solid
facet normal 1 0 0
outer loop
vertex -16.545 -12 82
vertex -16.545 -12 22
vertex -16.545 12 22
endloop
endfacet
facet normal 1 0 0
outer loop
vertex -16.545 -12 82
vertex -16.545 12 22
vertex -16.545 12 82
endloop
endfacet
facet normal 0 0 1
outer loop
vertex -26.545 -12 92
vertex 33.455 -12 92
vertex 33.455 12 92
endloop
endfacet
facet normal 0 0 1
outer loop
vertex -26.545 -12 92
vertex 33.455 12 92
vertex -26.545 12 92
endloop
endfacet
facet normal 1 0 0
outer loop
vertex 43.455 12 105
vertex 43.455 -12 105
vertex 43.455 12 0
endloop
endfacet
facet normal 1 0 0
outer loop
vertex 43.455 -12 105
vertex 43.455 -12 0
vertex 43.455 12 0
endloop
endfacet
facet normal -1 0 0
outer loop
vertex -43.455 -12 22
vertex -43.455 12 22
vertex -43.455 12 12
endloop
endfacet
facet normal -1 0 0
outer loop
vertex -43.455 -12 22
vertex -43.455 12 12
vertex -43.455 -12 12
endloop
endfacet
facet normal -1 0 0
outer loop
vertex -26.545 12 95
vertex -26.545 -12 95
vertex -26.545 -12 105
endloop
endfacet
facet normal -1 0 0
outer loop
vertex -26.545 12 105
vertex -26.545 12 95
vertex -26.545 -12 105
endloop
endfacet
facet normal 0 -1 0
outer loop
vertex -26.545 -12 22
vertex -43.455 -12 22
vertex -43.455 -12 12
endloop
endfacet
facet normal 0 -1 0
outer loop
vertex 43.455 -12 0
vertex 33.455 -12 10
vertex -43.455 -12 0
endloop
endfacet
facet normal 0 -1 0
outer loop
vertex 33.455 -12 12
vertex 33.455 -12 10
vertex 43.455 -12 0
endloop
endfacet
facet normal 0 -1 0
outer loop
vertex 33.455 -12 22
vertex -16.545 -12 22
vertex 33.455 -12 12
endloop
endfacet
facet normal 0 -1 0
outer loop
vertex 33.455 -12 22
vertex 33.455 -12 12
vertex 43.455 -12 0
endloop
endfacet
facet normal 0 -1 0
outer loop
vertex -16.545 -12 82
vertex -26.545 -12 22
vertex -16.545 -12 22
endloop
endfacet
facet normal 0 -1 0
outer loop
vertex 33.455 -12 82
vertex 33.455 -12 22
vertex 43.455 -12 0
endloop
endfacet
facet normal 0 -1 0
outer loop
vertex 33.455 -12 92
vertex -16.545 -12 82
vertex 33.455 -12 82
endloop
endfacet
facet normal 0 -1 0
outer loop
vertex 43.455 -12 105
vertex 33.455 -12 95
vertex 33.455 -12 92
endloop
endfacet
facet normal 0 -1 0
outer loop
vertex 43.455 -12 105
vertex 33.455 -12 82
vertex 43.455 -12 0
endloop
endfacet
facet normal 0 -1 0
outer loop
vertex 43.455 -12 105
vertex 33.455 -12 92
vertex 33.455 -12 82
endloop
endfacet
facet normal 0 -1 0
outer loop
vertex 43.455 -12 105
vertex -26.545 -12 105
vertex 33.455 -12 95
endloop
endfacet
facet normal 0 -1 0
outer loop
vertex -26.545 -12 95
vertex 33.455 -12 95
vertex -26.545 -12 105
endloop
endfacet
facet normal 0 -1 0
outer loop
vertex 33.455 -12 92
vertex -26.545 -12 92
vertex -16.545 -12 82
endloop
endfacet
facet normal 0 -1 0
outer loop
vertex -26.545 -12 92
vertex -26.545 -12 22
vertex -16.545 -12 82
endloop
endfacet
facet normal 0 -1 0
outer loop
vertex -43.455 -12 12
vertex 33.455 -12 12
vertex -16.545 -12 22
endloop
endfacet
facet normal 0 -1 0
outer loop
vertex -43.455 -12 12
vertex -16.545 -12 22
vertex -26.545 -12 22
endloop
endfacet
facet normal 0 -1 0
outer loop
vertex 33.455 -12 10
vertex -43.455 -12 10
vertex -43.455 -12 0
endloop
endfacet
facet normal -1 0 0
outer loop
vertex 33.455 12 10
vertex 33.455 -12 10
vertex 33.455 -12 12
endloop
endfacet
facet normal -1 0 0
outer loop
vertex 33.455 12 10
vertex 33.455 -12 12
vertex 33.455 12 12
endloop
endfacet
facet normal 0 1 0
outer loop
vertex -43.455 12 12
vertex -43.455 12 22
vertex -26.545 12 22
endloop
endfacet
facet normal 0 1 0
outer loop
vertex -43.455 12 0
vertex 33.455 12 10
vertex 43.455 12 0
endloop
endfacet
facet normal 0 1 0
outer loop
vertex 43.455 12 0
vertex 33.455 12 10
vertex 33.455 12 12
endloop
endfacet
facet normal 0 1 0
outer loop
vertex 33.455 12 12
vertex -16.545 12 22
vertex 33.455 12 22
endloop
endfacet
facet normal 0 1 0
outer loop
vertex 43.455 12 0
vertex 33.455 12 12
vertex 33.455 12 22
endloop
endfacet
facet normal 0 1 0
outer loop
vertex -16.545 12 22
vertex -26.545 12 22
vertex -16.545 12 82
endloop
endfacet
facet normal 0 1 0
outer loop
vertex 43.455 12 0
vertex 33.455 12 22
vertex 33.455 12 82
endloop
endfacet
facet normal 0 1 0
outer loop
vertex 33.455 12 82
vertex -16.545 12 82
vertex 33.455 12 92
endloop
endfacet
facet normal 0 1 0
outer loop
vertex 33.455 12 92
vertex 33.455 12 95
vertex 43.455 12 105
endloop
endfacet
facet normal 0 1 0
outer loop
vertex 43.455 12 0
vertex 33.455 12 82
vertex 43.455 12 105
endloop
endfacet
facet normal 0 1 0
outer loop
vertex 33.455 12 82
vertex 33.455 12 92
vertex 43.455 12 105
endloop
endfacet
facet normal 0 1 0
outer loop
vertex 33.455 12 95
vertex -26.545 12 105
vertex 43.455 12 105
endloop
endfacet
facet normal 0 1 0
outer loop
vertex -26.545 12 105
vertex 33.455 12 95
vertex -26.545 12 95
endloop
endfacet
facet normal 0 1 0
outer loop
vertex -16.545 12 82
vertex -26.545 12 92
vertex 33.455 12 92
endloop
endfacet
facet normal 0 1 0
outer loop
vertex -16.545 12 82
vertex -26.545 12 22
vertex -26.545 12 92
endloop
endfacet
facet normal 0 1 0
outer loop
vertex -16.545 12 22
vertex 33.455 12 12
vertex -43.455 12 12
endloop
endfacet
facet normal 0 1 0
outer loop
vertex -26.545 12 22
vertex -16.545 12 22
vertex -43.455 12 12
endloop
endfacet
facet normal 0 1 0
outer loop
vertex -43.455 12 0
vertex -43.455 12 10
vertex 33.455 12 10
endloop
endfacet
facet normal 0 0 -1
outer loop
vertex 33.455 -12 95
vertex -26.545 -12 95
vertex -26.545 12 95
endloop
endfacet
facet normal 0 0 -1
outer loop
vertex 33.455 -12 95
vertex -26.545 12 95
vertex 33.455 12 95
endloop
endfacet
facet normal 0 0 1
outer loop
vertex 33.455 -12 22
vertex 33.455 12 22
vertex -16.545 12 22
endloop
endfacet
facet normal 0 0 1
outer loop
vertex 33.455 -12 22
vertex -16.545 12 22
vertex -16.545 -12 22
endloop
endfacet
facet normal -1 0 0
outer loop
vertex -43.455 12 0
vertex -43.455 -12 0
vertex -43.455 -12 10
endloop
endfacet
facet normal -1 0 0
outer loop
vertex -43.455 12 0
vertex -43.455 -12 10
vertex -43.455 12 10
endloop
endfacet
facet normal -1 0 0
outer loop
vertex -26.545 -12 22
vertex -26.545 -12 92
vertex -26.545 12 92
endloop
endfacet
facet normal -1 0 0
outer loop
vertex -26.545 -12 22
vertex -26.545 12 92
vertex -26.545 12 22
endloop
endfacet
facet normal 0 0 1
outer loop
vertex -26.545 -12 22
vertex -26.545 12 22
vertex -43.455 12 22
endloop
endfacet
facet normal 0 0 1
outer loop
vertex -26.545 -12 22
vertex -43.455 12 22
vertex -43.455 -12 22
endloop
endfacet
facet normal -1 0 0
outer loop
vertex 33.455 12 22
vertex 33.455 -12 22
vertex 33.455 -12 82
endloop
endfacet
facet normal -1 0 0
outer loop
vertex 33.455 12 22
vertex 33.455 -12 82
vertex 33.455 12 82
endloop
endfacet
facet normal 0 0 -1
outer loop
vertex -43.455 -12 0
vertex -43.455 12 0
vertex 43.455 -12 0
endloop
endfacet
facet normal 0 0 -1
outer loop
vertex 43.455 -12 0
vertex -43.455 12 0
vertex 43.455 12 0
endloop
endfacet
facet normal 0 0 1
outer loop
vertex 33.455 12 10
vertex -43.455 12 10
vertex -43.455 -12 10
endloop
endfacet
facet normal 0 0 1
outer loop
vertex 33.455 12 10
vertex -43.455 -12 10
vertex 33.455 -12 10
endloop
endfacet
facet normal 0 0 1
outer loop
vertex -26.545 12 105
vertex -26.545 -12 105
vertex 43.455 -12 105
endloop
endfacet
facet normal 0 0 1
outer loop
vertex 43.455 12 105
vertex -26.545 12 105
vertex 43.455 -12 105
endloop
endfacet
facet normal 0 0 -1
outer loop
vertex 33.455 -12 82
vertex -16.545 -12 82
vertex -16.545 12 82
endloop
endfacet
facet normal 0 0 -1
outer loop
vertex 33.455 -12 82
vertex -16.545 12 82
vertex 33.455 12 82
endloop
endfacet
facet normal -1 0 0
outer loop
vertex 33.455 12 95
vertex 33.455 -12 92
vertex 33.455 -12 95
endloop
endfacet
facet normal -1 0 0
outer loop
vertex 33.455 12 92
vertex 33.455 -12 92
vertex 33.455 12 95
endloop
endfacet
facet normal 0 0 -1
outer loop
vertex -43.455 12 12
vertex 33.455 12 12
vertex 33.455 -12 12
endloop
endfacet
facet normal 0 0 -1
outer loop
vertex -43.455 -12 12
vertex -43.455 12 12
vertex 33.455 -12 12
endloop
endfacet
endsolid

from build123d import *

# Parameters (mm, degrees)
F0_W     = 86.909074
F0_H     = 24
F1_DEPTH = 10
F2_W     = 10
F2_H     = 24
F3_DEPTH = 95
F4_W     = 24
F4_H     = 10
F5_DEPTH = 76.909075
F6_W     = 60
F6_H     = 10
F7_DEPTH = 24


with BuildPart() as f1:
    # F0 (on Top) → F1 (new body)
    with BuildSketch(Plane.XY):
        Rectangle(F0_W, F0_H)
    extrude(amount=F1_DEPTH)

    # F2 (on face) → F3 (join)
    with BuildSketch(Plane.XY.offset(10)):
        with Locations((38.454537, 0)):
            Rectangle(F2_W, F2_H)
    extrude(amount=F3_DEPTH)

    # F4 (on face) → F5 (join, through all)
    with BuildSketch(Plane(origin=(33.454537, 0, 0), x_dir=(0, -1, 0), z_dir=(-1, 0, 0))):
        with Locations((0, 17)):
            Rectangle(F4_W, F4_H)
    extrude(amount=F5_DEPTH)

    # F6 (on face) → F7 (join, through all)
    with BuildSketch(Plane.XZ.offset(12)):
        Polygon((-26.545463, 92), (-26.545463, 22), (-16.545463, 22), (-16.545463, 82), (33.454537, 82), (33.454537, 92), align=None)
        with Locations((3.454537, 100)):
            Rectangle(F6_W, F6_H)
    extrude(amount=-F7_DEPTH)


solid = f1.part
